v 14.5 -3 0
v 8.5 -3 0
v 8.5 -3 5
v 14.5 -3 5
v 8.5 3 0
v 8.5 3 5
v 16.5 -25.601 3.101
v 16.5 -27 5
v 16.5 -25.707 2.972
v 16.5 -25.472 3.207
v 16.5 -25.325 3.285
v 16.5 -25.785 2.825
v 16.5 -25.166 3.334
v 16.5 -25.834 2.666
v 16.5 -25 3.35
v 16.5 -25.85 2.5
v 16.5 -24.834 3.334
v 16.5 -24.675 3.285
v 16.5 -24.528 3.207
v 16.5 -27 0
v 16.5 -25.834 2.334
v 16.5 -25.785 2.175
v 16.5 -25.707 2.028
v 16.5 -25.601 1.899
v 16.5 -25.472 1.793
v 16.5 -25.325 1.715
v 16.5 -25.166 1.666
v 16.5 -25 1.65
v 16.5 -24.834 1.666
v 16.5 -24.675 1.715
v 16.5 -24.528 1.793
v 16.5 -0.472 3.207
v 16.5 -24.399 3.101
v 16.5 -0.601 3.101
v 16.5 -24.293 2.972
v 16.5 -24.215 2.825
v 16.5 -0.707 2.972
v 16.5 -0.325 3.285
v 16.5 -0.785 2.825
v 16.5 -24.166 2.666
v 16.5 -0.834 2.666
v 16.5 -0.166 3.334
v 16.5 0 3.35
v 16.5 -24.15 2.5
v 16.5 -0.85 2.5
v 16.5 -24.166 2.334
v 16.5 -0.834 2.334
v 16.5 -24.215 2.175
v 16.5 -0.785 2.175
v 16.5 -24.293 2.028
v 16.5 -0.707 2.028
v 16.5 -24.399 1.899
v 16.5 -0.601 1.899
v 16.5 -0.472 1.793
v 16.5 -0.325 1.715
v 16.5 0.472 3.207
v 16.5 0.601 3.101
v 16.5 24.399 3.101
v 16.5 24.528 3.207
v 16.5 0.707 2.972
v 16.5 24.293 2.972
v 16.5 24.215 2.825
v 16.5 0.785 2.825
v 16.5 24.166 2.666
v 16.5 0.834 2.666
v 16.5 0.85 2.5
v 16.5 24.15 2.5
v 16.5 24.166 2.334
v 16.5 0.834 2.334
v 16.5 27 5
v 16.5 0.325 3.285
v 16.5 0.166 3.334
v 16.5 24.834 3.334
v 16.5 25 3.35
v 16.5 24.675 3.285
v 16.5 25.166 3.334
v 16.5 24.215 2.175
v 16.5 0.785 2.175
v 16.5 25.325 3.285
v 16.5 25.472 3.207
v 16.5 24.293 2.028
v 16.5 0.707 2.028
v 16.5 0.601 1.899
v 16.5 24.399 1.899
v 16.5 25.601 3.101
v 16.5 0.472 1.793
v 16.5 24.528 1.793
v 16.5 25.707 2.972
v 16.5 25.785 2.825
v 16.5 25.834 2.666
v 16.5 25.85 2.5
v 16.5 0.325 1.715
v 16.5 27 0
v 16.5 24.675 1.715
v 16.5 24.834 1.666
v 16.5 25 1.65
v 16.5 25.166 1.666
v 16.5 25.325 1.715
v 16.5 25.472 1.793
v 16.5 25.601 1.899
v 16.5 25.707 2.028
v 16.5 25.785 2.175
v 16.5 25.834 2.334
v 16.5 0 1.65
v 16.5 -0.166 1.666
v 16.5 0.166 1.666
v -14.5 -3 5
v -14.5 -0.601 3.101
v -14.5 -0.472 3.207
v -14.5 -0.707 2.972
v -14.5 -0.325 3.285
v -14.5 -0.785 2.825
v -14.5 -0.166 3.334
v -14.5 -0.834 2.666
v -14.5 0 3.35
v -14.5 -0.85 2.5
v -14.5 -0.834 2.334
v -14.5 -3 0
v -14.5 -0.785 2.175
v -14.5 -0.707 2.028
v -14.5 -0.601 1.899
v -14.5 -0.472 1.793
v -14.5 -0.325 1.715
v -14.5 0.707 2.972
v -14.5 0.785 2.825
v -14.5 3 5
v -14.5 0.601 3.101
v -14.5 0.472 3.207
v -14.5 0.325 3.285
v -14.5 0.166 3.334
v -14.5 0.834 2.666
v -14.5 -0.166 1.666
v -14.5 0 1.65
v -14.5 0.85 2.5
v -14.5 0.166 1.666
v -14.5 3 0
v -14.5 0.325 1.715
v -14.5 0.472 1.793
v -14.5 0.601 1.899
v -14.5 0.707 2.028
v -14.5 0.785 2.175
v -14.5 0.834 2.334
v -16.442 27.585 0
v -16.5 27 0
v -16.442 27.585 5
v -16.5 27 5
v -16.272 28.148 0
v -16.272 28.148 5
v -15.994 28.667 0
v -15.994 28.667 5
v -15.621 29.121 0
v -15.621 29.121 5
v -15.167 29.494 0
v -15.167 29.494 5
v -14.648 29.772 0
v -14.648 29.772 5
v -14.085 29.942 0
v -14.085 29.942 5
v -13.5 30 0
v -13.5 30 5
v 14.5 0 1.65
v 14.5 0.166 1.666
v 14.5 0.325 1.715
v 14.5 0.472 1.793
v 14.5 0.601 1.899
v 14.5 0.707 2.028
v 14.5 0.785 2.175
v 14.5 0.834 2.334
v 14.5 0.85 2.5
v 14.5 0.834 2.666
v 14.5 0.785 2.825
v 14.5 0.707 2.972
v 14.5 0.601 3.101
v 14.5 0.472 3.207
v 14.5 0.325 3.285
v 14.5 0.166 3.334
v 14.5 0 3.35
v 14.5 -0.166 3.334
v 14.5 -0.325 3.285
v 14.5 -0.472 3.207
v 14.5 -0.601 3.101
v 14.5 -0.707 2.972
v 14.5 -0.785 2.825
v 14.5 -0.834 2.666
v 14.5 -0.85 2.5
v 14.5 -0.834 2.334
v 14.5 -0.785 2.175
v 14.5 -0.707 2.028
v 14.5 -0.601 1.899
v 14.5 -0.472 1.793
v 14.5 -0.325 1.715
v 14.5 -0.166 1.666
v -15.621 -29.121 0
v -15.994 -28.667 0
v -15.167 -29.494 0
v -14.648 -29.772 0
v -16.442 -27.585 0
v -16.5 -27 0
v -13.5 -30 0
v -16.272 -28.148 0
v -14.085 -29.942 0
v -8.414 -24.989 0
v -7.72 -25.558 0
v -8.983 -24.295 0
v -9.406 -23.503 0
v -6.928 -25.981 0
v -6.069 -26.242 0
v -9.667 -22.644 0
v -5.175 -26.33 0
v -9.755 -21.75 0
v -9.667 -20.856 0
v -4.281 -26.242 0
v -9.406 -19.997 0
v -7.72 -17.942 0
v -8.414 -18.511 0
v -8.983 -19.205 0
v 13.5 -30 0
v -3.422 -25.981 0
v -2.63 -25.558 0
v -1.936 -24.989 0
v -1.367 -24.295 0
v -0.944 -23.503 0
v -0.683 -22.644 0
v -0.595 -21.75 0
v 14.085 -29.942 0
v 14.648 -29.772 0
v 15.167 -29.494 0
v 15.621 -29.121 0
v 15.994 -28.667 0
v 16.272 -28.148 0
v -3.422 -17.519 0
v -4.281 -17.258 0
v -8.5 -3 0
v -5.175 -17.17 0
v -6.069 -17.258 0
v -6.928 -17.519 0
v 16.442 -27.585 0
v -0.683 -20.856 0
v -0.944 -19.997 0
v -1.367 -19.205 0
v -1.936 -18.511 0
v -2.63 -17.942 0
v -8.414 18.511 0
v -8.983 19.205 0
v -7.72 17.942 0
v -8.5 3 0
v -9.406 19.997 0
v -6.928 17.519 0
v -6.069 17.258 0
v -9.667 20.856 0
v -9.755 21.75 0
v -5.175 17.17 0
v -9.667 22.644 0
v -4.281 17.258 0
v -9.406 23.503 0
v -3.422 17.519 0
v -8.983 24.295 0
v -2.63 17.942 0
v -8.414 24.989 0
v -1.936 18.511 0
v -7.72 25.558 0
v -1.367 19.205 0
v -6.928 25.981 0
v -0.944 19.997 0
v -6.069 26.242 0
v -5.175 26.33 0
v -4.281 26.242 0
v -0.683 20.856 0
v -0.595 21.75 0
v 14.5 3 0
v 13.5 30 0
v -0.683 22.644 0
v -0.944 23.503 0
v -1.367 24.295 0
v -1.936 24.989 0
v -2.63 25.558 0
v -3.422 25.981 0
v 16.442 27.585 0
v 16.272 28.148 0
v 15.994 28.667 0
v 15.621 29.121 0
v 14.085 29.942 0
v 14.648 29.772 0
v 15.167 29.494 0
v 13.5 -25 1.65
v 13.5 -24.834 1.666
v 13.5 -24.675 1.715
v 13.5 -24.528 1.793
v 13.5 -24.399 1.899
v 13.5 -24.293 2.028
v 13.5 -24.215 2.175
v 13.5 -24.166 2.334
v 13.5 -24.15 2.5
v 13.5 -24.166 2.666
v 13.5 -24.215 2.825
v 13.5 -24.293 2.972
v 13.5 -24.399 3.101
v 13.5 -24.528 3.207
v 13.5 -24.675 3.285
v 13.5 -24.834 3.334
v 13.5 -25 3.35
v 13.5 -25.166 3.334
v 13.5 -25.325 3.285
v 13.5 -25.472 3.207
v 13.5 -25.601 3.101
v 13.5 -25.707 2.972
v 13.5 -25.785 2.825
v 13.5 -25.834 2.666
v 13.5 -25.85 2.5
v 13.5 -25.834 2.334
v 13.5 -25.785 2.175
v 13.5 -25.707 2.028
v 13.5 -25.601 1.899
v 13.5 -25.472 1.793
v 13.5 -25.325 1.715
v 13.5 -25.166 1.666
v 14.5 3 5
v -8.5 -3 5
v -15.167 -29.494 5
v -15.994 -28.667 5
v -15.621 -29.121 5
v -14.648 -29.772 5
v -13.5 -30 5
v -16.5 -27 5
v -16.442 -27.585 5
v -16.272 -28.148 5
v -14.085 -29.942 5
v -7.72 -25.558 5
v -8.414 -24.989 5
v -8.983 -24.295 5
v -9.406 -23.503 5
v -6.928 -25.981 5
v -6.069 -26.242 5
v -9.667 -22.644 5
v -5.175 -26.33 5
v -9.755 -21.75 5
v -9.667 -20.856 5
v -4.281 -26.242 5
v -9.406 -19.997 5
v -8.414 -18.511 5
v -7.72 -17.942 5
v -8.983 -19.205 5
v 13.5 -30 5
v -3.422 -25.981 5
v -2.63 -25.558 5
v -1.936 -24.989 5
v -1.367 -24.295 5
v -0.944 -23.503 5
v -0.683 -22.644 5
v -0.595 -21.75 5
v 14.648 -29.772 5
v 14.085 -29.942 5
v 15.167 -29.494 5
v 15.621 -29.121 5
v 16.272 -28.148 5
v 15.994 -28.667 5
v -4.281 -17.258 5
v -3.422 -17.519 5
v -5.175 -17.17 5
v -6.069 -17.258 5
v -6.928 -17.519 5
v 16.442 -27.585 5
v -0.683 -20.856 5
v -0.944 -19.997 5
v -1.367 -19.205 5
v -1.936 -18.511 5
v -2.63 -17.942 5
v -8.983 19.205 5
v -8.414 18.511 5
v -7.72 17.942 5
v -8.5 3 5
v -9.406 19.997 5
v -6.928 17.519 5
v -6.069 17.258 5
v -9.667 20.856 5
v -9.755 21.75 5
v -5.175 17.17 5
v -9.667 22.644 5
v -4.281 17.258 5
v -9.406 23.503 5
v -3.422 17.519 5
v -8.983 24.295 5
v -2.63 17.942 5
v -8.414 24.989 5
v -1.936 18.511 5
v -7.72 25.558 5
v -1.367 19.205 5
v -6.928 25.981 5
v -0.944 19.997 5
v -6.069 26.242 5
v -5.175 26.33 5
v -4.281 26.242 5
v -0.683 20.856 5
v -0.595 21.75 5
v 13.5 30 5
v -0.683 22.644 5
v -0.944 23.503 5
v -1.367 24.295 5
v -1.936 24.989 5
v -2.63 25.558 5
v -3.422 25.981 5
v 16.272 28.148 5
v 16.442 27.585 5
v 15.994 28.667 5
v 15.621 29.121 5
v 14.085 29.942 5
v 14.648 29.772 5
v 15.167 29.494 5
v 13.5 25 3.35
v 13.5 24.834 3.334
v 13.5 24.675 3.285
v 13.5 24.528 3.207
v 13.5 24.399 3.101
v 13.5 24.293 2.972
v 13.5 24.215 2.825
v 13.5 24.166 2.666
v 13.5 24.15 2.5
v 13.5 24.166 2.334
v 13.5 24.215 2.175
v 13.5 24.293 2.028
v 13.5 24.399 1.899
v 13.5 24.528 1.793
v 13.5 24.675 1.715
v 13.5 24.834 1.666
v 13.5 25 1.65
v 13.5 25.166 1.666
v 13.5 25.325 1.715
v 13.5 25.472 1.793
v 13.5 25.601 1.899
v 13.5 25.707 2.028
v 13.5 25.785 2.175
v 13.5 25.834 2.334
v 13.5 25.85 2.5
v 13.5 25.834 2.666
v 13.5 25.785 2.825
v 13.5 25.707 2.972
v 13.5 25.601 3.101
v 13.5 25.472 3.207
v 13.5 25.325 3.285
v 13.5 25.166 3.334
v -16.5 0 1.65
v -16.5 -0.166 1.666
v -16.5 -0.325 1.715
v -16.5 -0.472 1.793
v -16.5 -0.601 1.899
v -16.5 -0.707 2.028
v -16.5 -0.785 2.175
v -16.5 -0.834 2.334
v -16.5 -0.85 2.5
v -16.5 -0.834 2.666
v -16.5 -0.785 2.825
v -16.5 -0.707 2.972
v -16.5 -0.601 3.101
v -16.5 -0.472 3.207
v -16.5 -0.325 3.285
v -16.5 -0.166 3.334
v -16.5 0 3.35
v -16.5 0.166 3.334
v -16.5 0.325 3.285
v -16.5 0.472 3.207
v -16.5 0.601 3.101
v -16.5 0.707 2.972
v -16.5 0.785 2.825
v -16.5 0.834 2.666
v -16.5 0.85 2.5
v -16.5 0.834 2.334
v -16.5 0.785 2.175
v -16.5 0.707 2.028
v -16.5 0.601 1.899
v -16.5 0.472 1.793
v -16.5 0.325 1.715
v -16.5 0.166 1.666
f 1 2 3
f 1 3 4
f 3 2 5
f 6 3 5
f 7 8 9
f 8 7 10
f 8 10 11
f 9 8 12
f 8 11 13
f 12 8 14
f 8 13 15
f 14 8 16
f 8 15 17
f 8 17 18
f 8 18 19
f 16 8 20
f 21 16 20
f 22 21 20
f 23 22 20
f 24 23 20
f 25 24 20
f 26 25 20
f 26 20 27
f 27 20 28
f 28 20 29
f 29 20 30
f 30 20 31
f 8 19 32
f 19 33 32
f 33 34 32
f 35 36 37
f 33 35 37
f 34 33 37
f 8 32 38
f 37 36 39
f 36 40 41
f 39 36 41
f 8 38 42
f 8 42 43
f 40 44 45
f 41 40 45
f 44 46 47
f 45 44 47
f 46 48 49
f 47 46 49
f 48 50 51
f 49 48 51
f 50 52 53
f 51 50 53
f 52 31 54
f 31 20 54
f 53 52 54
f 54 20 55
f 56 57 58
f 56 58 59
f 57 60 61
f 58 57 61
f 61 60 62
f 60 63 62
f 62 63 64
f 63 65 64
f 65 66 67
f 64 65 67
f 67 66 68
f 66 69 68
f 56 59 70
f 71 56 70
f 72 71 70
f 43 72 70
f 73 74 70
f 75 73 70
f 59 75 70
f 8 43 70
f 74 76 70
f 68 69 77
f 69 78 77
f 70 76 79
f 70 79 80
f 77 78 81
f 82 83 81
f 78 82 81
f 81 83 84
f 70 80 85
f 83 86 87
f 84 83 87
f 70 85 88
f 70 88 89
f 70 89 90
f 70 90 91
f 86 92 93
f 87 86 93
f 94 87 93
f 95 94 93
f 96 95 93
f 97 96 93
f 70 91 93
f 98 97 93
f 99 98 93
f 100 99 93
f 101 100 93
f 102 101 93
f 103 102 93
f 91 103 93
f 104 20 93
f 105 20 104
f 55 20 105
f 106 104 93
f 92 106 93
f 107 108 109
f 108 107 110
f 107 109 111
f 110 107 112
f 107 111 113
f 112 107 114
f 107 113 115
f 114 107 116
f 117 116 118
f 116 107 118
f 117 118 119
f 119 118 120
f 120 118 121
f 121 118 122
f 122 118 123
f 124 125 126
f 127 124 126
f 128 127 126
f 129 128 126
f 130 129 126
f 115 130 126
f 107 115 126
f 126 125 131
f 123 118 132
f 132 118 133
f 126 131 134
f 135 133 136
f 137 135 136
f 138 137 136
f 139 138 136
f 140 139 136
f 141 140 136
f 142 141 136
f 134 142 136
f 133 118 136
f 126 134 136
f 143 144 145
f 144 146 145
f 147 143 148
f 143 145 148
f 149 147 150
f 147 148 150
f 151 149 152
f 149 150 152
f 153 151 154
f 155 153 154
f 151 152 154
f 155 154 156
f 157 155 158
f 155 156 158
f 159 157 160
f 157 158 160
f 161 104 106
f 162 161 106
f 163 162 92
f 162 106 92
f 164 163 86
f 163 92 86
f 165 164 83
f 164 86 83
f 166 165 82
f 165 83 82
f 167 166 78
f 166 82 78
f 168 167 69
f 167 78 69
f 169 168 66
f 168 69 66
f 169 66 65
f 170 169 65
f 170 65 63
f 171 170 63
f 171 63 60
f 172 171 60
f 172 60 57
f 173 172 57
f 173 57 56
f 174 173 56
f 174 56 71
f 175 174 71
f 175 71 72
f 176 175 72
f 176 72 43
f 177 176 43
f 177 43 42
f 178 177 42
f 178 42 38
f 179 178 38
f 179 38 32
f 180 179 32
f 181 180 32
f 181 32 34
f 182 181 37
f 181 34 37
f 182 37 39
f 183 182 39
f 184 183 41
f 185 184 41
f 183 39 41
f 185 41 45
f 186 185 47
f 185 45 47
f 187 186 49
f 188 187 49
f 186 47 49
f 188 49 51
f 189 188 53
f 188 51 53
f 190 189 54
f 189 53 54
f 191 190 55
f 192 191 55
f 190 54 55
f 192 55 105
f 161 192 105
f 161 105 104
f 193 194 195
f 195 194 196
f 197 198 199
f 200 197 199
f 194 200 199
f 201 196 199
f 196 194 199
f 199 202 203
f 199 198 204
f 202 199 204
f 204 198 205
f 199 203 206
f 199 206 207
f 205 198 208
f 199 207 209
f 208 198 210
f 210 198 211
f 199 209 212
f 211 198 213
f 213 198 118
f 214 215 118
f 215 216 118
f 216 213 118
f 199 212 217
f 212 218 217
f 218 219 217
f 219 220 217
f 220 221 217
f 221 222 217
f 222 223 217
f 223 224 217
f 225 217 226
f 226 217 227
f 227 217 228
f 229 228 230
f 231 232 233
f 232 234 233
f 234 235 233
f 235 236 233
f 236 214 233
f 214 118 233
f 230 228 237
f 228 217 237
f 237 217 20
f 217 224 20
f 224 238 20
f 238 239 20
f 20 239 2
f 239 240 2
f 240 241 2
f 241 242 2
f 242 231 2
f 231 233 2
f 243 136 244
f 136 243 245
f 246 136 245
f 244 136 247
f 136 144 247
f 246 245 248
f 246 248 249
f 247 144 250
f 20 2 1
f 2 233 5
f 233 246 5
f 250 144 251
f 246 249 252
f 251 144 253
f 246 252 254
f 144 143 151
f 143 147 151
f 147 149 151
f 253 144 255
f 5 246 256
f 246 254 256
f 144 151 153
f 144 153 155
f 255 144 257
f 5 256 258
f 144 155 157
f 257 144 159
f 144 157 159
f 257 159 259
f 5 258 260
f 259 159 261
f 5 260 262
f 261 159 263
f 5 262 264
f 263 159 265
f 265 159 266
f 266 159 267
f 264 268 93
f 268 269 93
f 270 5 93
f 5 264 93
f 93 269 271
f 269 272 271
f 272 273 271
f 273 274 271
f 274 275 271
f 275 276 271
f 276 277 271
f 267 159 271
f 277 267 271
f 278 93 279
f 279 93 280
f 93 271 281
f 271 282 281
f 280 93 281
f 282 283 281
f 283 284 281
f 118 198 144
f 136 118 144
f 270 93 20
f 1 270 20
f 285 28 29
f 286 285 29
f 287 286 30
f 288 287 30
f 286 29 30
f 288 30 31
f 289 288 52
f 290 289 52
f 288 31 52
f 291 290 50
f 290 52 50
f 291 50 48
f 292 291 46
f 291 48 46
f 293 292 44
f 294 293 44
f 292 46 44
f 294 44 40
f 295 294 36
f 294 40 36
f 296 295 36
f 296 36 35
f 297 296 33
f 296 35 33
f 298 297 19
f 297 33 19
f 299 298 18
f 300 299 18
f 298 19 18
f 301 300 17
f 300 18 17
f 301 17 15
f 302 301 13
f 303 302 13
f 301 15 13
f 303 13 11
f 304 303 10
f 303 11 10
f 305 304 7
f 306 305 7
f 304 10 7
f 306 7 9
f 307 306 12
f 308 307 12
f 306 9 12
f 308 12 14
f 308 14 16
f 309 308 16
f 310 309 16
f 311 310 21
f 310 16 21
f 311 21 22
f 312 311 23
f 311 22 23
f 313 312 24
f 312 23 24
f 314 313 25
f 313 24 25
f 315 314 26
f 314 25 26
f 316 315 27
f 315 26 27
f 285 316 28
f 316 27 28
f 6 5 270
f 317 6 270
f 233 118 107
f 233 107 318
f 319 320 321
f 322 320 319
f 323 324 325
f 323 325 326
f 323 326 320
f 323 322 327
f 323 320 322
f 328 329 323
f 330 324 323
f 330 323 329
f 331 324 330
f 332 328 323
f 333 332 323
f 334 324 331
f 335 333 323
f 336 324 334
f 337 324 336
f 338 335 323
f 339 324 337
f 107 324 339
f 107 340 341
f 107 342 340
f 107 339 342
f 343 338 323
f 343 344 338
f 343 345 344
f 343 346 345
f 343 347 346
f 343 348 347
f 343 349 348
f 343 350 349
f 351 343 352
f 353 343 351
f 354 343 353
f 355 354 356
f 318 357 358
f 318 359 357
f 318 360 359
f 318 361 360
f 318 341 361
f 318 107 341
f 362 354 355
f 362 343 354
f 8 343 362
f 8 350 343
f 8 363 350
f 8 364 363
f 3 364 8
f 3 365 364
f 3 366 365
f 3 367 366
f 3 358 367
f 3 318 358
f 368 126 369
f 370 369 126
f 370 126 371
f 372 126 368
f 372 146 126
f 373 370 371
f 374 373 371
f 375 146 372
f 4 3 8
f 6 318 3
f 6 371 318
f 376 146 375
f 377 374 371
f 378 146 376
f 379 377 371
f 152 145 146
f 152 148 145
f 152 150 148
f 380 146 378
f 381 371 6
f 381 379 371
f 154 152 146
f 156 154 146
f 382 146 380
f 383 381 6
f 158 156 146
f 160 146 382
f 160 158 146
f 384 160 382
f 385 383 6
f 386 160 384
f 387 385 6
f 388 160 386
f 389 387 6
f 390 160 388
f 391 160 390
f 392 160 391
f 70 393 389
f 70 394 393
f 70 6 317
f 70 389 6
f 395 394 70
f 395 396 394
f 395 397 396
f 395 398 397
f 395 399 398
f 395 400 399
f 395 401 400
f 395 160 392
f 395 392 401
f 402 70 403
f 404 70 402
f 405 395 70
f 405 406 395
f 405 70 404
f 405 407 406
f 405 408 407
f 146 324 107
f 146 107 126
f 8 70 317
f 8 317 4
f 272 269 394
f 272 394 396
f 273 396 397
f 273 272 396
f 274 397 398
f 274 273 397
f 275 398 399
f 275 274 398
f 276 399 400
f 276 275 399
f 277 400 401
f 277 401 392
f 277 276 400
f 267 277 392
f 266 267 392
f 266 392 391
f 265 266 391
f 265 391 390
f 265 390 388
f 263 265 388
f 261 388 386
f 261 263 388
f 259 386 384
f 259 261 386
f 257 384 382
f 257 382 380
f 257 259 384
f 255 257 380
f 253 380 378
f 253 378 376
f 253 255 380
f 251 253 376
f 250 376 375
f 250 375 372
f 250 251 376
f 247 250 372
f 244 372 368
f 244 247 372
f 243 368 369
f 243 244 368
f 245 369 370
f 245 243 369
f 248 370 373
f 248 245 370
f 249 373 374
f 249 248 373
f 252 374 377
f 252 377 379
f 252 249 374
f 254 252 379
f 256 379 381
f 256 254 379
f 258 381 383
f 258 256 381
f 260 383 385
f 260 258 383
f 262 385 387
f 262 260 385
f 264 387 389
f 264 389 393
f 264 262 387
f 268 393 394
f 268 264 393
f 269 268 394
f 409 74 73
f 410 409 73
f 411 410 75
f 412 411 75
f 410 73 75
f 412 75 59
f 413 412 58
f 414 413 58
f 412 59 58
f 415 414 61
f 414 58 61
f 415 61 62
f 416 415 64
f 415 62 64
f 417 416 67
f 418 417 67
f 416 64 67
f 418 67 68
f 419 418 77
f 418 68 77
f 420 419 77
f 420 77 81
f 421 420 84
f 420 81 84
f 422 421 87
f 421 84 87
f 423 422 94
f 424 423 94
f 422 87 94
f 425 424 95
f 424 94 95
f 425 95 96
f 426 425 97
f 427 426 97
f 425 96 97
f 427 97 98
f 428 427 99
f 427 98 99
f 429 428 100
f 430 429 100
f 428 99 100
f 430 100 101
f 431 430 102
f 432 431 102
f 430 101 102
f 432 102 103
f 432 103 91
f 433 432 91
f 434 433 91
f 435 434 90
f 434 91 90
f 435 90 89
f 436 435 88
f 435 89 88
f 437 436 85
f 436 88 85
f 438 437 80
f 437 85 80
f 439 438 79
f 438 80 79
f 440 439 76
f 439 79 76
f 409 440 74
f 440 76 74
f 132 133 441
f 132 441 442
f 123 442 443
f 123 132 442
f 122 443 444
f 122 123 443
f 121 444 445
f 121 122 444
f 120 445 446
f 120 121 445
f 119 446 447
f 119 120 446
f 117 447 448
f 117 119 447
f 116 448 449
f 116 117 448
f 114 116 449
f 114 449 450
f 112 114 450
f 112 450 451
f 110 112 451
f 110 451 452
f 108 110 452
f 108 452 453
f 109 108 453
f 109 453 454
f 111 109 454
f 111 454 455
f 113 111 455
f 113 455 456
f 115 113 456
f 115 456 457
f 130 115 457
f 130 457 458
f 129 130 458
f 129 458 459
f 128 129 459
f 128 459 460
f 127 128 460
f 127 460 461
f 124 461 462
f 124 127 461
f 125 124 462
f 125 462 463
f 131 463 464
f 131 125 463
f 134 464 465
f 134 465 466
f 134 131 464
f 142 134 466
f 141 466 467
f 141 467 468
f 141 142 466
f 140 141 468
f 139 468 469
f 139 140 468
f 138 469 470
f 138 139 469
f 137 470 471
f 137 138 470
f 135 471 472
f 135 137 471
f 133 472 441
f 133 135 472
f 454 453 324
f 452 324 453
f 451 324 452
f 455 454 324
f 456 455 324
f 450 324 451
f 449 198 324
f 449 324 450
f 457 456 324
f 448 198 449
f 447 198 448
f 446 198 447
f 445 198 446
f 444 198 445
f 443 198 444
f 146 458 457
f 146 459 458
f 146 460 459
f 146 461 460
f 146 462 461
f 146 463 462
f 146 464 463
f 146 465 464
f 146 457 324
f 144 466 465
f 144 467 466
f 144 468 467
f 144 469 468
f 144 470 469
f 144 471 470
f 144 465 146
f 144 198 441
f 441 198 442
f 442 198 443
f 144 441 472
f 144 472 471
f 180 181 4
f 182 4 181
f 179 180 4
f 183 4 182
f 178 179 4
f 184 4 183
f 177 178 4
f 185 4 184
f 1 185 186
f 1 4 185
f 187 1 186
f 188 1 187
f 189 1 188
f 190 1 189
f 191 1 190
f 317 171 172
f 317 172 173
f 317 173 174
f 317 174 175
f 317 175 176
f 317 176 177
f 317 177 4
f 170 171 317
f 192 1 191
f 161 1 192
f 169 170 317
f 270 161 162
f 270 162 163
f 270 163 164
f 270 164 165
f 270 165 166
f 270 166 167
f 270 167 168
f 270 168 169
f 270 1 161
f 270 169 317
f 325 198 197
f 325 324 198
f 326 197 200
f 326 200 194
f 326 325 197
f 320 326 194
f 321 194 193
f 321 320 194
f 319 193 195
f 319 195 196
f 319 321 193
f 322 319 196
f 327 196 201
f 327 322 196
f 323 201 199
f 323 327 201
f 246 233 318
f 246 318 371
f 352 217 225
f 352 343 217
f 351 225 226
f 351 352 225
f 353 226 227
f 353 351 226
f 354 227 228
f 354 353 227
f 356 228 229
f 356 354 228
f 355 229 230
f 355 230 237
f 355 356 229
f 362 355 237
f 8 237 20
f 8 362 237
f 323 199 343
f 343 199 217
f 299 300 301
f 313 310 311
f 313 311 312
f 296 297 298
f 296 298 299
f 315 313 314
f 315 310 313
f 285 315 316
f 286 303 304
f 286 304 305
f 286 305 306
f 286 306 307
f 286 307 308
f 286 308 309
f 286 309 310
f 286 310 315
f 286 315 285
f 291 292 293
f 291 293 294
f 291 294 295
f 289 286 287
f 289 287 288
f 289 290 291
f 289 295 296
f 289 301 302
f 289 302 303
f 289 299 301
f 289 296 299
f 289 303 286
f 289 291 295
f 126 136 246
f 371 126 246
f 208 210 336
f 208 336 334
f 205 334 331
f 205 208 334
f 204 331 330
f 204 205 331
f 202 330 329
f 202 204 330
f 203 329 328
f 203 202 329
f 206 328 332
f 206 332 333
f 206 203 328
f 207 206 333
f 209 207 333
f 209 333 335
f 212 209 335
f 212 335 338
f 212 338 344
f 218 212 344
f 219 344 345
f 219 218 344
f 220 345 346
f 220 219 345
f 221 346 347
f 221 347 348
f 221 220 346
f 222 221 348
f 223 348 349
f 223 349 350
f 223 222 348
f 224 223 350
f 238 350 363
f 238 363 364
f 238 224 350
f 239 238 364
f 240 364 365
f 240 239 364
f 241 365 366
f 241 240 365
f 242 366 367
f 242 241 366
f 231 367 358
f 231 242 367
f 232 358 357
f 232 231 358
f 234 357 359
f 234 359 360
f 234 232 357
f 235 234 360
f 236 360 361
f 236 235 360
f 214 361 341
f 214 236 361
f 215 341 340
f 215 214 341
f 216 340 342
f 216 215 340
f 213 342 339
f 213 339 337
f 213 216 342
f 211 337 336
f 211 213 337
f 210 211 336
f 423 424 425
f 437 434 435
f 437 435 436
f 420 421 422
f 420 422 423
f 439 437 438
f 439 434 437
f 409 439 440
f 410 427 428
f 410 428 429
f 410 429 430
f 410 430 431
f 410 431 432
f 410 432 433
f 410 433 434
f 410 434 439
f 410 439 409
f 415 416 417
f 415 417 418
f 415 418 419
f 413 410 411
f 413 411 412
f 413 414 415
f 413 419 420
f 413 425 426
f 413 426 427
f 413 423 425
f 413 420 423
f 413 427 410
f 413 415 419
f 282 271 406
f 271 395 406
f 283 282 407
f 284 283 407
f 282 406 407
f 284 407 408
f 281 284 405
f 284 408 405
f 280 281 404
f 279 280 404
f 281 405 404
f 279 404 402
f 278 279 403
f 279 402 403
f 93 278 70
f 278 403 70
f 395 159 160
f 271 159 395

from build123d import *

# Parameters (mm, degrees)
SKETCH1_W           = 33
SKETCH1_H           = 60
SKETCH1_R           = 4.58
SKETCH1_W_2         = 6
SKETCH1_H_2         = 6
BOSS_EXTRUDE1_DEPTH = 5
SKETCH2_R           = 0.85
CUT_EXTRUDE1_DEPTH  = 3
CUT_EXTRUDE2_START  = -3
SKETCH3_R           = 0.85
CUT_EXTRUDE2_DEPTH  = 3
FILLET1_R           = 3


with BuildPart() as part:
    # Sketch1 → Boss-Extrude1 (new body)
    with BuildSketch(Plane.XY):
        Rectangle(SKETCH1_W, SKETCH1_H)
        with Locations((-5.175, 21.75)):
            Circle(SKETCH1_R, mode=Mode.SUBTRACT)
        with Locations(Location((-5.175, -21.75, 0), (0, 0, 180))):
            Circle(SKETCH1_R, mode=Mode.SUBTRACT)
        with Locations((11.5, 0)):
            Rectangle(SKETCH1_W_2, SKETCH1_H_2, mode=Mode.SUBTRACT)
        with Locations((-11.5, 0)):
            Rectangle(SKETCH1_W_2, SKETCH1_H_2, mode=Mode.SUBTRACT)
    extrude(amount=BOSS_EXTRUDE1_DEPTH)

    # Sketch2 → Cut-Extrude1 (cut)
    with BuildSketch(Plane(origin=(16.5, 0, 0), x_dir=(0, 0, -1), z_dir=(1, 0, 0))):
        with Locations((-2.5, 0)):
            Circle(SKETCH2_R)
        with Locations((-2.5, -25)):
            Circle(SKETCH2_R)
        with Locations(Location((-2.5, 25, 0), (0, 0, 180))):
            Circle(SKETCH2_R)
    extrude(amount=-CUT_EXTRUDE1_DEPTH, mode=Mode.SUBTRACT)

    # Sketch3 → Cut-Extrude2 (cut)
    with BuildSketch(Plane.ZY.offset(16.5).offset(CUT_EXTRUDE2_START)):
        with Locations(Location((2.5, 0, 0), (0, 0, 180))):
            Circle(SKETCH3_R)
    extrude(amount=CUT_EXTRUDE2_DEPTH, mode=Mode.SUBTRACT)

    # Fillet1
    fillet1_edges = [part.edges().sort_by_distance(p)[0] for p in [
        (16.5, -30, 2.5),
        (-16.5, -30, 2.5),
        (-16.5, 30, 2.5),
        (16.5, 30, 2.5),
    ]]
    fillet(fillet1_edges, radius=FILLET1_R)


solid = part.part
